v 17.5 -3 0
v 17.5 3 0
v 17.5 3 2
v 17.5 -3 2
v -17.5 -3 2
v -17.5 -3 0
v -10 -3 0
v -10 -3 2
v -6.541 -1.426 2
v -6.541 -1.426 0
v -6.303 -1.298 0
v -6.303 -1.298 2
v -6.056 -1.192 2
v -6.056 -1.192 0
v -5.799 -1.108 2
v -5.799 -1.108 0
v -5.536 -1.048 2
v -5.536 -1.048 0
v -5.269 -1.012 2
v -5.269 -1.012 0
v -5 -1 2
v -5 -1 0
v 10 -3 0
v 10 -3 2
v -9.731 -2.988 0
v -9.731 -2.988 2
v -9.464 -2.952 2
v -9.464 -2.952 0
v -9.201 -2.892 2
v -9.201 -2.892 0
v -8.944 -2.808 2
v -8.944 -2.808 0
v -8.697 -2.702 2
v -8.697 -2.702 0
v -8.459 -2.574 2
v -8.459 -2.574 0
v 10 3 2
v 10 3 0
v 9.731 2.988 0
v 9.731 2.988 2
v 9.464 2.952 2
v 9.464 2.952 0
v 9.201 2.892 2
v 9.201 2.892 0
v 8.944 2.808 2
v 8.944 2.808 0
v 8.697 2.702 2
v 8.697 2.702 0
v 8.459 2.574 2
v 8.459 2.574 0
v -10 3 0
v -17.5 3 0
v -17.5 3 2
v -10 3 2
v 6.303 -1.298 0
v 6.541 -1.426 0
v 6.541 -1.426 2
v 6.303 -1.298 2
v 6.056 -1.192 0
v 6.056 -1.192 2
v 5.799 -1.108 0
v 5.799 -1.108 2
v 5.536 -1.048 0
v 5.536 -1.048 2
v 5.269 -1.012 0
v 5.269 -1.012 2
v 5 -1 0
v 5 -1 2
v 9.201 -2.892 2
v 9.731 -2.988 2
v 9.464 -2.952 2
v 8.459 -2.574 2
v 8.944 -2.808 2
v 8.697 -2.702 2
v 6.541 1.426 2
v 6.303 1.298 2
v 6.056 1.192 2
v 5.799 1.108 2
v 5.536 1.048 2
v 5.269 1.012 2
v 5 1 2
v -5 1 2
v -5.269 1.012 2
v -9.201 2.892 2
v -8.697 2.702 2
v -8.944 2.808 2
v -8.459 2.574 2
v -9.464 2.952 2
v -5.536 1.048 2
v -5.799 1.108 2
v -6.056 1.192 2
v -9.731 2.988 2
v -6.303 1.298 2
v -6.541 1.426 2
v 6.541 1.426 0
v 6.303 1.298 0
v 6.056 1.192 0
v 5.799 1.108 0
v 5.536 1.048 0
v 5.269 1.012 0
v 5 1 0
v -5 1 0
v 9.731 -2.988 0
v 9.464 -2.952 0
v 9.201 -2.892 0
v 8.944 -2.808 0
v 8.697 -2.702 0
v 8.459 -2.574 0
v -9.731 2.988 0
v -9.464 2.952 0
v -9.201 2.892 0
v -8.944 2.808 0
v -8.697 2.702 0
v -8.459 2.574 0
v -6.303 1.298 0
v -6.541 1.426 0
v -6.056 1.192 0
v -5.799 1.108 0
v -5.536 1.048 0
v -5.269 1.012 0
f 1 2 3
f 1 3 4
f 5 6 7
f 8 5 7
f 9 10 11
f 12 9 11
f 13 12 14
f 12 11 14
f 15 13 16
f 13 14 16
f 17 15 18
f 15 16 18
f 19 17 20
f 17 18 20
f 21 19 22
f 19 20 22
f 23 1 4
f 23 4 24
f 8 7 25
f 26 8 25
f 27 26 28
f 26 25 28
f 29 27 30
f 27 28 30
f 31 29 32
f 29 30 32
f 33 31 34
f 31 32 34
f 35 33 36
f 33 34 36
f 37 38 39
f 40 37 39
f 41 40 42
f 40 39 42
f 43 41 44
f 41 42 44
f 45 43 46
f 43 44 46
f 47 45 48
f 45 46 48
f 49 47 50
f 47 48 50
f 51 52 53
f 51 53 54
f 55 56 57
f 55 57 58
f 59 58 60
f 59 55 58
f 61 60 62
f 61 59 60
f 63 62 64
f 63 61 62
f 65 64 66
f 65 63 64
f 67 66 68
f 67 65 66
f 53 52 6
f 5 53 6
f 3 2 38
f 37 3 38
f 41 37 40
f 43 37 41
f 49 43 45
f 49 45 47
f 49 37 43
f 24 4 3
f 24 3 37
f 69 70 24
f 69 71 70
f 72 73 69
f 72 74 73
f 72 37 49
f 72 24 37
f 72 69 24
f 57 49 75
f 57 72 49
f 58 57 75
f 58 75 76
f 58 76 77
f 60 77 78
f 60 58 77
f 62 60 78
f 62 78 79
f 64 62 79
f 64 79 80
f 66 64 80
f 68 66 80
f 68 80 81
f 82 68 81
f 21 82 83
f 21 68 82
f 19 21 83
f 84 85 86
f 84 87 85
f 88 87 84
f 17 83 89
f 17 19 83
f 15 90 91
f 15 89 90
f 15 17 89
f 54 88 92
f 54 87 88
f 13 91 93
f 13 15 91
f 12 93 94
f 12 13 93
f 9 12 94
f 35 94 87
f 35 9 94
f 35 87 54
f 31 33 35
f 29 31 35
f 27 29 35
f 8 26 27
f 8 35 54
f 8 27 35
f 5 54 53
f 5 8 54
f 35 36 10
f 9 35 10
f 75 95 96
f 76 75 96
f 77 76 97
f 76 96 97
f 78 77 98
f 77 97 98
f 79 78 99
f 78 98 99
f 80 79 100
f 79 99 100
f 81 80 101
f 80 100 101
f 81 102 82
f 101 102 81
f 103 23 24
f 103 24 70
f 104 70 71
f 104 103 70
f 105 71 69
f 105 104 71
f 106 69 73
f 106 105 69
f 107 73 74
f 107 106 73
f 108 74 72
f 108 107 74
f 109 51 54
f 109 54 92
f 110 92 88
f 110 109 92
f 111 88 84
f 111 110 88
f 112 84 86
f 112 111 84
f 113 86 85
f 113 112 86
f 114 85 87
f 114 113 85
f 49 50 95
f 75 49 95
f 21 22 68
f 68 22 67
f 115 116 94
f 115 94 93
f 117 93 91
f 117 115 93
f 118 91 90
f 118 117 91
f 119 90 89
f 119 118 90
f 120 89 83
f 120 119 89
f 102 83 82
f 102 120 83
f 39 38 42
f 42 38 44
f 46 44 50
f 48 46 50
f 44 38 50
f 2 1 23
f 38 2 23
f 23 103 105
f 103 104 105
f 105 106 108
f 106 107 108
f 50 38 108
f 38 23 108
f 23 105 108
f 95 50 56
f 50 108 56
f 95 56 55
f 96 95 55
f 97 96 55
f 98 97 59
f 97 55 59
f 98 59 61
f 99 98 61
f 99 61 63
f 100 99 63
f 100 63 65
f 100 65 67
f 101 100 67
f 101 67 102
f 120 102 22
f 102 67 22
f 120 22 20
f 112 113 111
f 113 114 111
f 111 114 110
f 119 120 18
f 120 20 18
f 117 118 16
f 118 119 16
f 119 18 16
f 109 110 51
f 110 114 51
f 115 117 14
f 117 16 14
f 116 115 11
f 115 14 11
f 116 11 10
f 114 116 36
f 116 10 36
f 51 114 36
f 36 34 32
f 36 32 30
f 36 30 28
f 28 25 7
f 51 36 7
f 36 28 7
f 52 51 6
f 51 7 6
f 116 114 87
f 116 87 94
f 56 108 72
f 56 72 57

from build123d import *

# Parameters (mm, degrees)
F1_DEPTH = 2


with BuildPart() as f1:
    # F0 (on Top) → F1 (new body)
    with BuildSketch(Plane.XY):
        with BuildLine():
            Line((0, 1), (0, 0))
            Line((0, 0), (17.5, 0))
            Line((17.5, 0), (17.5, 3))
            Line((17.5, 3), (10, 3))
            ThreePointArc((10, 3), (9.200786, 2.891584), (8.459337, 2.574171))
            Line((8.459337, 2.574171), (6.540663, 1.425829))
            ThreePointArc((6.540663, 1.425829), (5.799214, 1.108416), (5, 1))
            Line((5, 1), (0, 1))
        make_face()
    extrude(amount=F1_DEPTH)

    # F2: F1 across face


with BuildPart() as f1_1:
    add(f1.part)
    add(f1.part.mirror(Plane(origin=(8.75, 0, 1), x_dir=(1, 0, 0), z_dir=(0, -1, 0))))

    # F3: F1 across face


with BuildPart() as f1_2:
    add(f1_1.part)
    add(f1_1.part.mirror(Plane(origin=(0, 0, 1), x_dir=(0, -1, 0), z_dir=(-1, 0, 0))))


solid = f1_2.part
